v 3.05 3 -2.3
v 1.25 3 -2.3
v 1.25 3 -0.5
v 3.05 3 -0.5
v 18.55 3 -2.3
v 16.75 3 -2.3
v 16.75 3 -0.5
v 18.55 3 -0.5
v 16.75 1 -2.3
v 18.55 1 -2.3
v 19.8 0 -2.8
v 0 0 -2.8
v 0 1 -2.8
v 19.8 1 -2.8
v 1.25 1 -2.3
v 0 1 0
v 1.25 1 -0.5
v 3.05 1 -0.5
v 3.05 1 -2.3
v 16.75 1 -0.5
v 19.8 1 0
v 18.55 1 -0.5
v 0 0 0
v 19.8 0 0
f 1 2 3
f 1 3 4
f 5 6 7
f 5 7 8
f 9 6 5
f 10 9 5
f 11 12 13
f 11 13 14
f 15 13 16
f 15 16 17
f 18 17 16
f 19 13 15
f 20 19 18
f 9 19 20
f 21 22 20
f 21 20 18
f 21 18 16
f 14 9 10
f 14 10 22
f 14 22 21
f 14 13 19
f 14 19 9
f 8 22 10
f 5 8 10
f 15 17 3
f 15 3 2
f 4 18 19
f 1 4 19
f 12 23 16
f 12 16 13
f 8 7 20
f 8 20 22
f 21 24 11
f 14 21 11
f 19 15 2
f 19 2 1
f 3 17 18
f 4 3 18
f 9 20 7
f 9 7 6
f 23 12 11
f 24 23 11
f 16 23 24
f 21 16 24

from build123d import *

# Parameters (mm, degrees)
SKETCH1_W           = 19.8
SKETCH1_H           = 2.8
SKETCH1_W_2         = 1.8
SKETCH1_H_2         = 1.8
BOSS_EXTRUDE1_DEPTH = 1
SKETCH1_3_W         = 1.8
SKETCH1_3_H         = 1.8
BOSS_EXTRUDE2_DEPTH = 3


with BuildPart() as part:
    # Sketch1 → Boss-Extrude1 (new body)
    with BuildSketch(Plane(origin=(0, 0, 0), x_dir=(1, 0, 0), z_dir=(0, 1, 0))):
        with Locations((9.9, 1.4)):
            Rectangle(SKETCH1_W, SKETCH1_H)
        with Locations((2.15, 1.4)):
            Rectangle(SKETCH1_W_2, SKETCH1_H_2, mode=Mode.SUBTRACT)
        with Locations((17.65, 1.4)):
            Rectangle(SKETCH1_W_2, SKETCH1_H_2, mode=Mode.SUBTRACT)
    extrude(amount=BOSS_EXTRUDE1_DEPTH)

    # Sketch1<3> → Boss-Extrude2 (add)
    with BuildSketch(Plane(origin=(0, 0, 0), x_dir=(1, 0, 0), z_dir=(0, 1, 0))):
        with Locations((2.15, 1.4)):
            Rectangle(SKETCH1_3_W, SKETCH1_3_H)
        with Locations((17.65, 1.4)):
            Rectangle(SKETCH1_3_W, SKETCH1_3_H)
    extrude(amount=BOSS_EXTRUDE2_DEPTH)


solid = part.part
